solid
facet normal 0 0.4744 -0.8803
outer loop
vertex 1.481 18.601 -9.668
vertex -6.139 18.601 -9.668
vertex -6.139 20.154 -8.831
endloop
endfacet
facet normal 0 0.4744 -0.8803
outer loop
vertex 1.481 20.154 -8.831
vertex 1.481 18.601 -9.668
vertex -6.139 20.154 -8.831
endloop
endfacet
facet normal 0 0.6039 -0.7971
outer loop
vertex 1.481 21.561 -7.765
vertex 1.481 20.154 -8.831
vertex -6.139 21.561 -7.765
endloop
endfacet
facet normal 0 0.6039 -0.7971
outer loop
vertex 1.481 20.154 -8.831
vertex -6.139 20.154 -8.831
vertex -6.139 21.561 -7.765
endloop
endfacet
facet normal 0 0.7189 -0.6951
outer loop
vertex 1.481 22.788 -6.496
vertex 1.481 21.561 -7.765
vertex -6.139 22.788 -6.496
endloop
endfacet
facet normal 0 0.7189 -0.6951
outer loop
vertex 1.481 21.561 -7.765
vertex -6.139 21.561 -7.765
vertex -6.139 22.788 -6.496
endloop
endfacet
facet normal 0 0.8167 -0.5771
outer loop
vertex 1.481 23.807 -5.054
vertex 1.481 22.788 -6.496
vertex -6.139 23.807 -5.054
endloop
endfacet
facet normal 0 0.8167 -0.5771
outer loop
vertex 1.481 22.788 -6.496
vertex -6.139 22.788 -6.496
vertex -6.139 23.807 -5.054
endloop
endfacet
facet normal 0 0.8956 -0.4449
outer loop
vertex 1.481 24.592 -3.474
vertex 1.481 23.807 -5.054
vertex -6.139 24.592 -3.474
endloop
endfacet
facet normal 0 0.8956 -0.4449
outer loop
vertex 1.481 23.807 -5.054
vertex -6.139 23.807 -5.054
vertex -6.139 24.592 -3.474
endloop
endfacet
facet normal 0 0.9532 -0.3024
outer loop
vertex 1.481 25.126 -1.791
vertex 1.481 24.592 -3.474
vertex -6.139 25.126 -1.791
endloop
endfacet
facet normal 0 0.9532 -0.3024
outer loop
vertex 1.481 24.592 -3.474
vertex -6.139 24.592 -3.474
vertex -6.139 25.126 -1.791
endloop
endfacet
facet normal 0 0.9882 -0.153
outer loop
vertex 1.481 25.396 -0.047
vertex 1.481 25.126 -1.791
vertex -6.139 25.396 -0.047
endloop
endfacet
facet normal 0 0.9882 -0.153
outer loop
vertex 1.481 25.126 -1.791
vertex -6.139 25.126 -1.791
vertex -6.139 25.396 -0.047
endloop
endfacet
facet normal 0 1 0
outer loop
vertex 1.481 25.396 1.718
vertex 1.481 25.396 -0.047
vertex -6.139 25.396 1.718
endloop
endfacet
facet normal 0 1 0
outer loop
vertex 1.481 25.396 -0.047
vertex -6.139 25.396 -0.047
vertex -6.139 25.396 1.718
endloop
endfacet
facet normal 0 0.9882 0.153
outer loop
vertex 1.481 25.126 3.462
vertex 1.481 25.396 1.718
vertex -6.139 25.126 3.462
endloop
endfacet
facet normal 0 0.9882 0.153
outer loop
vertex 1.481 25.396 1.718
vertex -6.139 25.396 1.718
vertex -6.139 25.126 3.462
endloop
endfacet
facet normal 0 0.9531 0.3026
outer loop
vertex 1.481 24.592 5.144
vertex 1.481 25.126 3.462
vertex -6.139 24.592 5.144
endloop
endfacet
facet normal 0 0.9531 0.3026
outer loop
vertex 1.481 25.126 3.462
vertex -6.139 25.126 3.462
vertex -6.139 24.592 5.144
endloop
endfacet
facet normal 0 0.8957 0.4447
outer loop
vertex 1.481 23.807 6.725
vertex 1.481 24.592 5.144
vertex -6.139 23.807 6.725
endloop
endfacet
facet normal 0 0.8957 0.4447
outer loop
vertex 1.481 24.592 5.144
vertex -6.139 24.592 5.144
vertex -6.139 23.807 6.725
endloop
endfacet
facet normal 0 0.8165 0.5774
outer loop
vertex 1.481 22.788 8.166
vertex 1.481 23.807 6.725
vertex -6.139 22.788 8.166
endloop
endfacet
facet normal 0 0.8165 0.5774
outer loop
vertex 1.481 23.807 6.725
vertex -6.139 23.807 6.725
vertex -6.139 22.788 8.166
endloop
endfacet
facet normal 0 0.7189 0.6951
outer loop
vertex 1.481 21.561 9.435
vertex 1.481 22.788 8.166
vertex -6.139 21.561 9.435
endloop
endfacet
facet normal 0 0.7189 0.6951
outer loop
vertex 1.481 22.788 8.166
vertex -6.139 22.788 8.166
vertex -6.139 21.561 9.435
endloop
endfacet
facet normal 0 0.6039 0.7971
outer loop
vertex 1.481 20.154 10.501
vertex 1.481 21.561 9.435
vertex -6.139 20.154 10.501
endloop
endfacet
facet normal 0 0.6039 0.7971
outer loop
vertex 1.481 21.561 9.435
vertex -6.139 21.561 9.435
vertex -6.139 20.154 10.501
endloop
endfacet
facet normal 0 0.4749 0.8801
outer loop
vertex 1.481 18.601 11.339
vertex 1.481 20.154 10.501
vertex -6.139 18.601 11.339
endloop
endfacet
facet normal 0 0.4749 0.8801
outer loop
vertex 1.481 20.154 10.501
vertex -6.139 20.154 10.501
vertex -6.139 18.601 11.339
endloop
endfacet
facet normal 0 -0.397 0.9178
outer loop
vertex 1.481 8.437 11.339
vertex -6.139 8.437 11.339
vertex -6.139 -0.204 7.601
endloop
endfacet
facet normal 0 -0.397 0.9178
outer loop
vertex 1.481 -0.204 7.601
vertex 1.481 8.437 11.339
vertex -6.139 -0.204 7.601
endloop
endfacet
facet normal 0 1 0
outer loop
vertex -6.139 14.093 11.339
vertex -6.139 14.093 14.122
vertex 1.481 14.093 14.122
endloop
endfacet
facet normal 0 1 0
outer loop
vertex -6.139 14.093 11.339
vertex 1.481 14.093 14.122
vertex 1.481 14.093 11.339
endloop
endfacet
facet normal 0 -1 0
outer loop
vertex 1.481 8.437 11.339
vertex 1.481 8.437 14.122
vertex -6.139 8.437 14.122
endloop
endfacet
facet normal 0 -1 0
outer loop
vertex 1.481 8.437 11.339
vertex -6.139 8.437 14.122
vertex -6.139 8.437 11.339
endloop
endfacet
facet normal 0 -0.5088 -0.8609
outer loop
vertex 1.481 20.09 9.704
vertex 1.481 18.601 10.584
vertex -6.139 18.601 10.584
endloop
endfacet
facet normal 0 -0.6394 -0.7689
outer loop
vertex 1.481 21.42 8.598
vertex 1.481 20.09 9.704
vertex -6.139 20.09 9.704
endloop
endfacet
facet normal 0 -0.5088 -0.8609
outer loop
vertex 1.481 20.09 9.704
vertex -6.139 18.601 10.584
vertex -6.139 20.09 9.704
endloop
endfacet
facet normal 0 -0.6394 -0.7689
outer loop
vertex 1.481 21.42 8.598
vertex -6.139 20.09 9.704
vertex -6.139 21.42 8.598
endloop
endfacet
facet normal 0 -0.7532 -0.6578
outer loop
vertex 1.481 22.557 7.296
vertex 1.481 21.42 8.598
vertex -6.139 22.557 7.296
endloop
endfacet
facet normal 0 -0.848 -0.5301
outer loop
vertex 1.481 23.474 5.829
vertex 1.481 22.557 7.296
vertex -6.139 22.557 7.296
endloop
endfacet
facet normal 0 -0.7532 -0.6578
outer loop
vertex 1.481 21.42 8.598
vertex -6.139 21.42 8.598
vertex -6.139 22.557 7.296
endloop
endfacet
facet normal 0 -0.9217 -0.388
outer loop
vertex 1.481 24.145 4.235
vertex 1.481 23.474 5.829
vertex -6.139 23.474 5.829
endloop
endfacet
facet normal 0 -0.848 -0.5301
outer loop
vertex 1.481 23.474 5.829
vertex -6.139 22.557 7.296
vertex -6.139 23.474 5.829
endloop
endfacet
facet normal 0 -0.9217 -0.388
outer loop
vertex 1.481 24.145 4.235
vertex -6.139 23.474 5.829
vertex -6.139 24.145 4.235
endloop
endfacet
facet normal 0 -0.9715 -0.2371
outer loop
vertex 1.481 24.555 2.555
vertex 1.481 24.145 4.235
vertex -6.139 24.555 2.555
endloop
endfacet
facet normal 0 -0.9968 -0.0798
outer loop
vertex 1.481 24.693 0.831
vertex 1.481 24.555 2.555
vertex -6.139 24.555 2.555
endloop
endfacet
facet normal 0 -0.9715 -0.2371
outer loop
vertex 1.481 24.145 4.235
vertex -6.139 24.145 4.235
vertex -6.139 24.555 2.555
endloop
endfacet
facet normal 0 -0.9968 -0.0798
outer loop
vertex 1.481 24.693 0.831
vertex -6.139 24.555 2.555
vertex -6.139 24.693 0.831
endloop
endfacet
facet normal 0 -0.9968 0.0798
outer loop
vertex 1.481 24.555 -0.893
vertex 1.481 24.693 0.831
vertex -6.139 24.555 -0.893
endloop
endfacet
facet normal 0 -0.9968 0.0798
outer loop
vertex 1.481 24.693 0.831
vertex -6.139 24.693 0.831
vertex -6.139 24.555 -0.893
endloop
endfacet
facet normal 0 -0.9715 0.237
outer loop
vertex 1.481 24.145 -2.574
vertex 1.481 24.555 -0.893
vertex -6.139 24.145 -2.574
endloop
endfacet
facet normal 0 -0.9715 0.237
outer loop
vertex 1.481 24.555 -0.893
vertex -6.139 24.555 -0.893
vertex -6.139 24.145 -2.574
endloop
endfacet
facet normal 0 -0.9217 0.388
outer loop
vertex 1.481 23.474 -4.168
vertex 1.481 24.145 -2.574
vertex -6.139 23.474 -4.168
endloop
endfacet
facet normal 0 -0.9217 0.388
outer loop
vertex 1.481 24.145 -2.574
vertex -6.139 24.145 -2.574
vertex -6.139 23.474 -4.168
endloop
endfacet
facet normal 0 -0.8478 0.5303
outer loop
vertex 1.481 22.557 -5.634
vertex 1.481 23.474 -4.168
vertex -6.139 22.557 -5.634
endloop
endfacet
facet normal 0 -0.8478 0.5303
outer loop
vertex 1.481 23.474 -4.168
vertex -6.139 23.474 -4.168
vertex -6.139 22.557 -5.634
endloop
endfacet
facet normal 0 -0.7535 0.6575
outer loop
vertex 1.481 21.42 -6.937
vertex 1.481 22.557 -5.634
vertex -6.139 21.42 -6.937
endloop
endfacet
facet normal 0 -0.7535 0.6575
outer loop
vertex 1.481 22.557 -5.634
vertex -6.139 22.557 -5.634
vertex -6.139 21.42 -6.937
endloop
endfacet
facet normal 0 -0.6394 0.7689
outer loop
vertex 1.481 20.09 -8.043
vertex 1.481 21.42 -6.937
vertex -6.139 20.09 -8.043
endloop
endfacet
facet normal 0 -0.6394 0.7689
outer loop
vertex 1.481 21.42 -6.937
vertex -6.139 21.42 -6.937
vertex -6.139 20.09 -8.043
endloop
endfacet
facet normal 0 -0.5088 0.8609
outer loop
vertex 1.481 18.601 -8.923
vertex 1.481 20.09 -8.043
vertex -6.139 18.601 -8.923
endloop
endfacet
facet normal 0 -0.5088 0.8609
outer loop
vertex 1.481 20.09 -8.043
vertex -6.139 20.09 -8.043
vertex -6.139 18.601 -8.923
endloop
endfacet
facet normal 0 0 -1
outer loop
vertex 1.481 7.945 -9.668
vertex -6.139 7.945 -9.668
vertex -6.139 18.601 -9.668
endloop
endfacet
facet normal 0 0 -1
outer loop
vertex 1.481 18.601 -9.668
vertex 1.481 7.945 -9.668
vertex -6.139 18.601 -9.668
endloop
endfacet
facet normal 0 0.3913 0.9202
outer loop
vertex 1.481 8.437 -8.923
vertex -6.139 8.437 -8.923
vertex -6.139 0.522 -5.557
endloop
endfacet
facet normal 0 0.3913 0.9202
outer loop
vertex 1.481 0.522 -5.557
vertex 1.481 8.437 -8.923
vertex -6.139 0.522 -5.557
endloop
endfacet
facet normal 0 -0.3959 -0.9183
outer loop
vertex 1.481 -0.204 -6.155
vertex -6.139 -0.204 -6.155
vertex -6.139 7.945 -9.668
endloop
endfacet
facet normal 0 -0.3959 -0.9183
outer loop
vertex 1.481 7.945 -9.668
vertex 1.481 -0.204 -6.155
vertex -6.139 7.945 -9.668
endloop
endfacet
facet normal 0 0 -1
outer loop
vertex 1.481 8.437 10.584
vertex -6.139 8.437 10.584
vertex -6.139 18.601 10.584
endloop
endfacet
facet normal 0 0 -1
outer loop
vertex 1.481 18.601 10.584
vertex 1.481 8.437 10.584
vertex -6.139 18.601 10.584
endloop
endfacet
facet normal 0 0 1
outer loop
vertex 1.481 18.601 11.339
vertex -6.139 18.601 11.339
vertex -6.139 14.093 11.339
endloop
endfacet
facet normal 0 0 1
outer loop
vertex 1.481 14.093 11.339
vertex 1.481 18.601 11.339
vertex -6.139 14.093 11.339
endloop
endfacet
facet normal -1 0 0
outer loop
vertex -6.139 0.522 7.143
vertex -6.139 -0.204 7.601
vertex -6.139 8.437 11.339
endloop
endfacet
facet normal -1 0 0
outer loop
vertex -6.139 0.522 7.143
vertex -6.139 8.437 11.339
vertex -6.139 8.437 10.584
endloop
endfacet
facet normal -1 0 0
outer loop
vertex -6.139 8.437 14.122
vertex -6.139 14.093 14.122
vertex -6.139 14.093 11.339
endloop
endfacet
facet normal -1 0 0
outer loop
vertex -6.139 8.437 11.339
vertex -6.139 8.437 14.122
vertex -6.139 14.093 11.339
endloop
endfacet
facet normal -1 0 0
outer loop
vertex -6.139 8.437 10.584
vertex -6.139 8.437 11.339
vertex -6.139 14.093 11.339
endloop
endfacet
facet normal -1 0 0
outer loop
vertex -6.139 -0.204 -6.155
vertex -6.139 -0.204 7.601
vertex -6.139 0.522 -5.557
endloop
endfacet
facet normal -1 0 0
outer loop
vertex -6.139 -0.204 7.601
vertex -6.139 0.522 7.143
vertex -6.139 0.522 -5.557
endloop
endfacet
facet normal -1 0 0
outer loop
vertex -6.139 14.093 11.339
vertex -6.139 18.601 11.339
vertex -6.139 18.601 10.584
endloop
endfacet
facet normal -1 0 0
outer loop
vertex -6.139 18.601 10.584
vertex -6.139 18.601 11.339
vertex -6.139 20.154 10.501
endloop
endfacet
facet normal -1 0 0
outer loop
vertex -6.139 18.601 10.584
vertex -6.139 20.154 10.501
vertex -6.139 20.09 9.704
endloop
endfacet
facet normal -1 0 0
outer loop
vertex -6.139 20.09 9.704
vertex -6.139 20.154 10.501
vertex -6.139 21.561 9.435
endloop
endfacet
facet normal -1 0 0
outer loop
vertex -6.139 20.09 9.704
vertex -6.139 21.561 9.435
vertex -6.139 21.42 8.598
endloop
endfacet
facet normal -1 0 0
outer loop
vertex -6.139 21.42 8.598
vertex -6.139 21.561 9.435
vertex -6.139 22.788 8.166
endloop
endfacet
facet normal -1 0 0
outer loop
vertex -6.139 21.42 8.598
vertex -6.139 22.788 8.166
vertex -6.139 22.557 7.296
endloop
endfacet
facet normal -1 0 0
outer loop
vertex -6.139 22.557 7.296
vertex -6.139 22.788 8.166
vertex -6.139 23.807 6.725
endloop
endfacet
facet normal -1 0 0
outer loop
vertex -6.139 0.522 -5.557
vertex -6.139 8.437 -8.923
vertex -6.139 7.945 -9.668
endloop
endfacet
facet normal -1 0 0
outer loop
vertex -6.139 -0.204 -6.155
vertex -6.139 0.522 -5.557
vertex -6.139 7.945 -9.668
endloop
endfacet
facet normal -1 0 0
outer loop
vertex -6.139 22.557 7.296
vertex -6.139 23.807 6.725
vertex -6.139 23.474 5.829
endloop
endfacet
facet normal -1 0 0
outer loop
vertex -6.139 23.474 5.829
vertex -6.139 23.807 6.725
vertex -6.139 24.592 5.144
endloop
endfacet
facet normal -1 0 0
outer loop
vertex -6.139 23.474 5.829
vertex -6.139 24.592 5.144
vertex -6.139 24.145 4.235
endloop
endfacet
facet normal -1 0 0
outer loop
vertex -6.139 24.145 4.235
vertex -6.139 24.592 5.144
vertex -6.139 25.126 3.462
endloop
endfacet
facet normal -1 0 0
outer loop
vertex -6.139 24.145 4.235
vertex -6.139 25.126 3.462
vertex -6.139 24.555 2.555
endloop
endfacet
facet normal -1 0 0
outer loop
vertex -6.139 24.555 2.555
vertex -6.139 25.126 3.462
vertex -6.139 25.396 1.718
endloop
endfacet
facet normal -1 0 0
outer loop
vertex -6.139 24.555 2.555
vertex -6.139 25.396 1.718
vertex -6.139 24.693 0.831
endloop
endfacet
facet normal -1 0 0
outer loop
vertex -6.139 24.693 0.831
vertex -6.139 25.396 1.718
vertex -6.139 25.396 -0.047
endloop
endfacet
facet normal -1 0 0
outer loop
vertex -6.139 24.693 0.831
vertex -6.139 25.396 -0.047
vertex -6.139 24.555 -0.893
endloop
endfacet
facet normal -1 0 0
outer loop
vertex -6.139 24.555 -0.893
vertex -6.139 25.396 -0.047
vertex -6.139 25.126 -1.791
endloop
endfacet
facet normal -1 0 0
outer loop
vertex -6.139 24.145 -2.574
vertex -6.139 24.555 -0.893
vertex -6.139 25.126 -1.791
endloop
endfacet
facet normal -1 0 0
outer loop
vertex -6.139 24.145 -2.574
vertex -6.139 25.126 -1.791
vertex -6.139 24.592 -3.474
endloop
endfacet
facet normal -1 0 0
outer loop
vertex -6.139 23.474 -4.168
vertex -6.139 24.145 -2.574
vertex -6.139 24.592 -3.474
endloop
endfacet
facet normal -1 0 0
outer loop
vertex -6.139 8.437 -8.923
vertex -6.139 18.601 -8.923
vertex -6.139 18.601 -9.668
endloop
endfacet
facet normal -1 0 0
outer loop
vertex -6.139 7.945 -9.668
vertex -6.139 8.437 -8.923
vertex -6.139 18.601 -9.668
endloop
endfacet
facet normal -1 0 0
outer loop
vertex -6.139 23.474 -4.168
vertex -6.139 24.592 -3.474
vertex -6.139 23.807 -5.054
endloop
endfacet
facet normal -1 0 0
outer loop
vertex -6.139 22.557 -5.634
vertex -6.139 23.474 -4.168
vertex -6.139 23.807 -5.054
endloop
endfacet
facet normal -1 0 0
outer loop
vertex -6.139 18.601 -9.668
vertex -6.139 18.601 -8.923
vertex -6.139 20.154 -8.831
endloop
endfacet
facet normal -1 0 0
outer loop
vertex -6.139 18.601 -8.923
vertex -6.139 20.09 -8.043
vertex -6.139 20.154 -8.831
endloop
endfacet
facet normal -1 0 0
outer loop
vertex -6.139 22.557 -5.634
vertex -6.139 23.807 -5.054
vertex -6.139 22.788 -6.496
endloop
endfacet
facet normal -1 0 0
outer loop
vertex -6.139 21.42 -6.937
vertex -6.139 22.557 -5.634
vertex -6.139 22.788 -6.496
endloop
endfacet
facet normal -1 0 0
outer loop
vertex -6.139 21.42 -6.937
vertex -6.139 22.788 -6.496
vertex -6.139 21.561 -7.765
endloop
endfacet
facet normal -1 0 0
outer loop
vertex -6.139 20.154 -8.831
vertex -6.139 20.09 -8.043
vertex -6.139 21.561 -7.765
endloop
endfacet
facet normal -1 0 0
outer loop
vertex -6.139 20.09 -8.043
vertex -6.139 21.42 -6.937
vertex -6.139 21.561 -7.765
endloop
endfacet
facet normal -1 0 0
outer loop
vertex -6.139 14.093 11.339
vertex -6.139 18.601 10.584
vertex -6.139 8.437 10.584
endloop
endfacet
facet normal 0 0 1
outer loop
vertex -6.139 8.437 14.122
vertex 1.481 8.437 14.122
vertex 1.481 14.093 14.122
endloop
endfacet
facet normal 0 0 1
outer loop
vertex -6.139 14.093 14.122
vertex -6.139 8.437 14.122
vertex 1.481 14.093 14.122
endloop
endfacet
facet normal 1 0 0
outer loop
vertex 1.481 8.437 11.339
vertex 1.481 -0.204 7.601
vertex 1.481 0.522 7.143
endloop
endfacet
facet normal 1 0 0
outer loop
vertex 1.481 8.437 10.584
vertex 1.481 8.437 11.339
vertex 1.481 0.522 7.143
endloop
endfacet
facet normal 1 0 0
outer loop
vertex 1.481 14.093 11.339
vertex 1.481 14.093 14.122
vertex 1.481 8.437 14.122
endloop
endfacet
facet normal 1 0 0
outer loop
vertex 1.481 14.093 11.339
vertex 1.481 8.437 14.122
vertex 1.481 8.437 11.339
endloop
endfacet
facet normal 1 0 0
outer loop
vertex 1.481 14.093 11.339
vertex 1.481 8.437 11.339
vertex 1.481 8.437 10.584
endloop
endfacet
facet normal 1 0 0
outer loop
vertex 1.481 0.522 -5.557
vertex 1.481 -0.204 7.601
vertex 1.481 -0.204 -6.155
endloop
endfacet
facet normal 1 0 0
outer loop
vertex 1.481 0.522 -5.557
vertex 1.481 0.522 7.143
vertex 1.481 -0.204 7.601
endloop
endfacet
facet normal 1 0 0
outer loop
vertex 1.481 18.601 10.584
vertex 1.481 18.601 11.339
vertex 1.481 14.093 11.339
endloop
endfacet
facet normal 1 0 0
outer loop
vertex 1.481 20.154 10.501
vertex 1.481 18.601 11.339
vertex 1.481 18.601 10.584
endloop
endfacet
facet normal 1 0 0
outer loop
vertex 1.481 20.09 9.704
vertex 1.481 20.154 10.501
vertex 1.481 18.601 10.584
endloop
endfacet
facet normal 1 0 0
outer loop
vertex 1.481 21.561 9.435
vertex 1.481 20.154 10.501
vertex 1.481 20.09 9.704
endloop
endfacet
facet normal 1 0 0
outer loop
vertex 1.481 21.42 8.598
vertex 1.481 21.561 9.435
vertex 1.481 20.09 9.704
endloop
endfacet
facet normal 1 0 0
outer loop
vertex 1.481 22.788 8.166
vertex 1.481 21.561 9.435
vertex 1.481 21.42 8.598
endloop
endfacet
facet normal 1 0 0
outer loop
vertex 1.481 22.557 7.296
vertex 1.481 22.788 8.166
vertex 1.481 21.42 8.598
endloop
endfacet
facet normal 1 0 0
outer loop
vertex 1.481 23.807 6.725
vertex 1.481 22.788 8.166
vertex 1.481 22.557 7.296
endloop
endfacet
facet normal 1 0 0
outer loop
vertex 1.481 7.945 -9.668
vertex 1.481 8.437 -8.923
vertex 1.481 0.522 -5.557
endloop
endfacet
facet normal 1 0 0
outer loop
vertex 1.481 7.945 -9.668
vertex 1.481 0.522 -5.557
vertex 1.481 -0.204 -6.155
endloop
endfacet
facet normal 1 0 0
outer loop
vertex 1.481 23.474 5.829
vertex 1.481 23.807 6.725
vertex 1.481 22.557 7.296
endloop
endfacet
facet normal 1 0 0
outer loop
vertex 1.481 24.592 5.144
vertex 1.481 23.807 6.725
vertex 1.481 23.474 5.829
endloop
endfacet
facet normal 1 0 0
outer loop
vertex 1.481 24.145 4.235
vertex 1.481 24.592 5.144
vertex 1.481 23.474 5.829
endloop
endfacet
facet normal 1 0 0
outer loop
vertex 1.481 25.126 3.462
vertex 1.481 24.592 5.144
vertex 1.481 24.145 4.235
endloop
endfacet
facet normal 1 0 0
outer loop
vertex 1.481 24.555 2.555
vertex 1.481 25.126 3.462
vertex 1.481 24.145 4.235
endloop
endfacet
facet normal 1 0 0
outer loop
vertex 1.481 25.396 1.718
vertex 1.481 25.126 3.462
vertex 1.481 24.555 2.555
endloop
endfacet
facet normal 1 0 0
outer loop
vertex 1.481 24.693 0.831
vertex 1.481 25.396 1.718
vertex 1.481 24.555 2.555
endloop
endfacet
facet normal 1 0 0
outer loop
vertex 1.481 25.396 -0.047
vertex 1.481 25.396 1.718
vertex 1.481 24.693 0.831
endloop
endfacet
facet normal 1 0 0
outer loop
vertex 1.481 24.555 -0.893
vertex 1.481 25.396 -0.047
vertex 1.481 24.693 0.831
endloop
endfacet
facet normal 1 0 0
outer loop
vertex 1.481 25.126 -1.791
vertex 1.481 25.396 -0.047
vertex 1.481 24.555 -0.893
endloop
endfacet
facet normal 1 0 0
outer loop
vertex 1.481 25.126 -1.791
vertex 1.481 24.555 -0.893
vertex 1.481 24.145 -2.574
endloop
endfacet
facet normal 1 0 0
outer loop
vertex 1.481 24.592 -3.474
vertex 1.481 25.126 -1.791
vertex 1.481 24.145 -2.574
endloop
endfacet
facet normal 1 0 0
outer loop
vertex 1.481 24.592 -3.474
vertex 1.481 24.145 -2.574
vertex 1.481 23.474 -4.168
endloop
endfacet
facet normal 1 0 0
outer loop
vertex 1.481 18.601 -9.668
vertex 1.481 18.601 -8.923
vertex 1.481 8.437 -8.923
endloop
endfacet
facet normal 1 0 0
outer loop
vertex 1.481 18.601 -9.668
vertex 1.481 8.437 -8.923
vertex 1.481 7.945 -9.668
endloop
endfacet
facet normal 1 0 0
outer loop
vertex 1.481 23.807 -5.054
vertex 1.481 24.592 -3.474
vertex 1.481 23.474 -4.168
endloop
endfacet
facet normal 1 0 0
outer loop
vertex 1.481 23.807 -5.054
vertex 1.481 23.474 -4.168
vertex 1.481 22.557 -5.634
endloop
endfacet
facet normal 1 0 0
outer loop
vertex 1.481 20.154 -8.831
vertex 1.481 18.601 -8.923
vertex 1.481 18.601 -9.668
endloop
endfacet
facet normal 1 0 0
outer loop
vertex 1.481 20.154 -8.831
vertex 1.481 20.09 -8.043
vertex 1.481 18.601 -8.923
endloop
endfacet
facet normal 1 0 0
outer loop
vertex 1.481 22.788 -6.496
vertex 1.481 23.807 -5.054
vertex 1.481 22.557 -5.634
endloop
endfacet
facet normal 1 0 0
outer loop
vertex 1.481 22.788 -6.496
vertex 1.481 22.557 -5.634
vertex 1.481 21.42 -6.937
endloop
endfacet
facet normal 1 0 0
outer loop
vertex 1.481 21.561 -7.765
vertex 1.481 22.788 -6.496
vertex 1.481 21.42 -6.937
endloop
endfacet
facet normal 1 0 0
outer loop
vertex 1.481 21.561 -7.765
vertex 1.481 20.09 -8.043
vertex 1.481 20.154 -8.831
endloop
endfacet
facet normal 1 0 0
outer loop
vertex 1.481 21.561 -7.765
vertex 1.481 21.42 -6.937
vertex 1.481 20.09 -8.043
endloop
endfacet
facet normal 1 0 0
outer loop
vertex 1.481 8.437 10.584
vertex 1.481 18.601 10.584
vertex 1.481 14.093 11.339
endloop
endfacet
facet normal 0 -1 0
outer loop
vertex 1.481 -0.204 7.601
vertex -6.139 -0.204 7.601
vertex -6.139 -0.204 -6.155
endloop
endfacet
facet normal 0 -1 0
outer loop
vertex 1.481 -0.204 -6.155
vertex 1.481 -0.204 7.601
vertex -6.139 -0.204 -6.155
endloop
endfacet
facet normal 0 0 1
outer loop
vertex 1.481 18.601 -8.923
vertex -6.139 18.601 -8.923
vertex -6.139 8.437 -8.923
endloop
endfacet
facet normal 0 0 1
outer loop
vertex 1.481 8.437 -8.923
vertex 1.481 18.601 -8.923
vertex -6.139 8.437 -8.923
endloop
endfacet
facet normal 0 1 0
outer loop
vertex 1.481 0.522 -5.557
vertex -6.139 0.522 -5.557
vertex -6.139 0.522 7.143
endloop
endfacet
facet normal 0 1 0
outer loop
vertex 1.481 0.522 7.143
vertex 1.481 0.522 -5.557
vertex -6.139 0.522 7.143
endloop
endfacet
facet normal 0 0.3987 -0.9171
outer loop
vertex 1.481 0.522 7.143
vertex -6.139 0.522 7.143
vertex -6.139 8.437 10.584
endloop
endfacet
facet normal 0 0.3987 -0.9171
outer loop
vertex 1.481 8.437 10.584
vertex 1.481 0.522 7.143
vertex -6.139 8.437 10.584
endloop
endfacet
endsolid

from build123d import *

# Parameters (mm, degrees)
BOSS_EXTRUDE1_DEPTH      = 3.81
BOSS_EXTRUDE1_DEPTH_BACK = 3.81
SKETCH3_W                = 2.783274099
SKETCH3_H                = 5.656099036
BOSS_EXTRUDE2_DEPTH      = 7.62


with BuildPart() as part:
    # Sketch2 → Boss-Extrude1 (new, two sides: drawn at the far end of the back side and taken through both)
    with BuildSketch(Plane(origin=(-2.32915921, 0, 0), x_dir=(0, 0, -1), z_dir=(1, 0, 0)).offset(-BOSS_EXTRUDE1_DEPTH_BACK)):
        with BuildLine():
            Line((-11.339007657, 18.600950631), (-11.339007657, 8.436760495))
            Line((-11.339007657, 8.436760495), (-7.601027883, -0.203787431))
            Line((-7.601027883, -0.203787431), (6.154737684, -0.203787431))
            Line((6.154737684, -0.203787431), (9.668438671, 7.945008476))
            Line((9.668438671, 7.945008476), (9.668438671, 18.600950631))
            ThreePointArc((9.668438671, 18.600950631), (-0.835284493, 25.430388096), (-11.339007657, 18.600950631))
        make_face()
        with BuildLine():
            Line((8.923024063, 18.600950631), (8.923024063, 8.436760495))
            Line((8.923024063, 8.436760495), (5.557346164, 0.521588901))
            Line((5.557346164, 0.521588901), (-7.142653836, 0.521588901))
            Line((-7.142653836, 0.521588901), (-10.584175937, 8.436760495))
            Line((-10.584175937, 8.436760495), (-10.584175937, 18.600950631))
            ThreePointArc((-10.584175937, 18.600950631), (-0.830575937, 24.692849221), (8.923024063, 18.600950631))
        make_face(mode=Mode.SUBTRACT)
    extrude(amount=BOSS_EXTRUDE1_DEPTH + BOSS_EXTRUDE1_DEPTH_BACK)

    # Sketch3 → Boss-Extrude2 (add)
    with BuildSketch(Plane(origin=(1.48084079, 0, 0), x_dir=(0, 0, -1), z_dir=(1, 0, 0))):
        with Locations((-12.730644707, 11.264810013)):
            Rectangle(SKETCH3_W, SKETCH3_H)
    extrude(amount=-BOSS_EXTRUDE2_DEPTH)


solid = part.part
